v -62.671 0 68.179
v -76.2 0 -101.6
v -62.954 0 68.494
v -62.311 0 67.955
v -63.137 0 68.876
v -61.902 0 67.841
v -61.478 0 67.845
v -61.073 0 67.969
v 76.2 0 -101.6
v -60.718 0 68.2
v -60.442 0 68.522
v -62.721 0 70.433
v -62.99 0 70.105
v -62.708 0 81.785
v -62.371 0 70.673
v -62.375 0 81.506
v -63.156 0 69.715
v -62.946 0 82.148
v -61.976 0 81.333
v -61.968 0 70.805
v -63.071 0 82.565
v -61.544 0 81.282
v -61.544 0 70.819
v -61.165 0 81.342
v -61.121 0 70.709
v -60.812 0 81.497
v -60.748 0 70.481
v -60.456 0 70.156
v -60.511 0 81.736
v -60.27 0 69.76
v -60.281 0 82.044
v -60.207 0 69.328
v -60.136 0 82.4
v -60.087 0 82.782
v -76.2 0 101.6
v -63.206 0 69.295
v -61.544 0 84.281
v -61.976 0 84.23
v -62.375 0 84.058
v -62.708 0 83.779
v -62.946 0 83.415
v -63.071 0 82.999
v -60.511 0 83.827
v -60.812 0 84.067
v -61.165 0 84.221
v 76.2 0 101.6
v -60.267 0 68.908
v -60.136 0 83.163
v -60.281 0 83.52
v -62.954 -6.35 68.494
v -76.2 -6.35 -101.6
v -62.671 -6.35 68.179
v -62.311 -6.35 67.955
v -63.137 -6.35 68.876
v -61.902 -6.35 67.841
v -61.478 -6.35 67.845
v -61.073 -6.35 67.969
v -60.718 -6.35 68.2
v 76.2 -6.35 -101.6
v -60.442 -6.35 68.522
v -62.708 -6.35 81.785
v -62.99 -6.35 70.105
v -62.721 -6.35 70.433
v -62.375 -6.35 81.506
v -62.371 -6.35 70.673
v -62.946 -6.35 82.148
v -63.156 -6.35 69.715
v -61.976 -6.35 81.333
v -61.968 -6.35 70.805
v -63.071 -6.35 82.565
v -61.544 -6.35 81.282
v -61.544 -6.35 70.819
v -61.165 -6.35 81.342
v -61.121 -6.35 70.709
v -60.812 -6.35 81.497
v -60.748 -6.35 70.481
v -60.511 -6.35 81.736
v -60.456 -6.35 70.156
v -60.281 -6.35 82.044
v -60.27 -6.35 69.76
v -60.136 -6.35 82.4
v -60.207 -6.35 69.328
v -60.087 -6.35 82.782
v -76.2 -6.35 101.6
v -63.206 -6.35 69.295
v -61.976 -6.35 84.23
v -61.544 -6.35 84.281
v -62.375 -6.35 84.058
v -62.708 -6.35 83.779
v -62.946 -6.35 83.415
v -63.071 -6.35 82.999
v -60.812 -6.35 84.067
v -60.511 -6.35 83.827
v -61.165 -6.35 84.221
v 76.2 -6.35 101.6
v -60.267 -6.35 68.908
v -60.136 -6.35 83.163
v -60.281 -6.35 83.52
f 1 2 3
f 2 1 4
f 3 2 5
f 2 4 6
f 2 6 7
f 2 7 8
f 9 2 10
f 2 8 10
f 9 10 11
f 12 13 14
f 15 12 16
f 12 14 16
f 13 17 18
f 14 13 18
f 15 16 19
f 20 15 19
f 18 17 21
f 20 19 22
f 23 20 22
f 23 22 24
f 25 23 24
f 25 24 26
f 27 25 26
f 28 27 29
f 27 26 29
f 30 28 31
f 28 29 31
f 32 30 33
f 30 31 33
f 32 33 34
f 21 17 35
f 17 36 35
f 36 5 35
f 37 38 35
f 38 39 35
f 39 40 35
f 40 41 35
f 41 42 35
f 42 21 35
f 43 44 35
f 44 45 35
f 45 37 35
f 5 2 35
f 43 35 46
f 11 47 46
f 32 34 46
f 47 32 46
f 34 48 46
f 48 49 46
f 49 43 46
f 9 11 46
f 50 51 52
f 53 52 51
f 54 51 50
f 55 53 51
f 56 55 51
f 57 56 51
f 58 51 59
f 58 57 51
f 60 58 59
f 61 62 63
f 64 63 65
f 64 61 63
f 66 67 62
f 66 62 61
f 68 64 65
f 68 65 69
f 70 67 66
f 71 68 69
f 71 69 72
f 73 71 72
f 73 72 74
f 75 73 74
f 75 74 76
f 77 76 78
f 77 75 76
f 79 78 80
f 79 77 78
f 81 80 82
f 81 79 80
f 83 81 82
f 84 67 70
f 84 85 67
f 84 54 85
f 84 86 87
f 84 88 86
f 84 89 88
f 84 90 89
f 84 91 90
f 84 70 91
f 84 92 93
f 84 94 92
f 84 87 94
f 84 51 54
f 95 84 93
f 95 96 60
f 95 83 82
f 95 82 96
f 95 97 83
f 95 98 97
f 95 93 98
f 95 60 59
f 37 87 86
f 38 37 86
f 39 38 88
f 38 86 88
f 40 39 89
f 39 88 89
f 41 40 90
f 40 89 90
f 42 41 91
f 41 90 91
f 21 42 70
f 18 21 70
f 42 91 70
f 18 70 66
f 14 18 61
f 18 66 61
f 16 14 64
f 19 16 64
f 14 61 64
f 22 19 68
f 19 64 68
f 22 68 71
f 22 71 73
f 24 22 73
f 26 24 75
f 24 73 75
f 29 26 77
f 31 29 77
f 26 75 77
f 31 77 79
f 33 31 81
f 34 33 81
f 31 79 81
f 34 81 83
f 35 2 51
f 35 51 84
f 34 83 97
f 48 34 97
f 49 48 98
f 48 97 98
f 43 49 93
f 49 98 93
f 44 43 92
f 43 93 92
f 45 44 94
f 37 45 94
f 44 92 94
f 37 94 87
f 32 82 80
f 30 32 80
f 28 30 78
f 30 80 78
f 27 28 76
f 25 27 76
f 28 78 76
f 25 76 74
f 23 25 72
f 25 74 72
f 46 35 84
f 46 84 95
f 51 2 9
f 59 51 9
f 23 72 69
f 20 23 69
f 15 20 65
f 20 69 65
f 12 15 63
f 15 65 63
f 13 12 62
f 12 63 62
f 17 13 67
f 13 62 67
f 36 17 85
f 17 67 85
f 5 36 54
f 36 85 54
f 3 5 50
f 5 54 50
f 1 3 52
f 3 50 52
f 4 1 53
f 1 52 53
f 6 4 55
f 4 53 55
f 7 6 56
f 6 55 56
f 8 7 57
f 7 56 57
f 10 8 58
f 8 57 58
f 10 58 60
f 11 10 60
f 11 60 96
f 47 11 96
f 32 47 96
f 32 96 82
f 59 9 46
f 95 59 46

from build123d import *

# Parameters (mm, degrees)
F0_W     = 152.4
F0_H     = 203.2
F1_DEPTH = 6.35
F4_DEPTH = 25
F5_DEPTH = 25


with BuildPart() as f1:
    # F0 (on Front) → F1 (new body)
    with BuildSketch(Plane.XZ):
        Rectangle(F0_W, F0_H)
    extrude(amount=F1_DEPTH)

    # F3 (on face) → F4 (cut)
    with BuildSketch(Plane.XZ.offset(6.35)):
        with BuildLine():
            Line((-61.5444034338, 82.55), (-61.5444034338, 84.2812365605))
            ThreePointArc((-61.5444034338, 84.2812365605), (-63.0868195891, 82.7818363905), (-61.5444034338, 81.2824362205))
            Line((-61.5444034338, 81.2824362205), (-61.5444034338, 82.55))
        make_face()
        with BuildLine():
            ThreePointArc((-61.5444034338, 81.2824362205), (-60.5112675837, 81.736280135), (-60.0868195891, 82.7818363905))
            ThreePointArc((-60.0868195891, 82.7818363905), (-60.5112675837, 83.827392646), (-61.5444034338, 84.2812365605))
            Line((-61.5444034338, 84.2812365605), (-61.5444034338, 82.55))
            Line((-61.5444034338, 82.55), (-61.5444034338, 81.2824362205))
        make_face()
    extrude(amount=-F4_DEPTH, mode=Mode.SUBTRACT)

    # F3 (on face) → F5 (cut)
    with BuildSketch(Plane.XZ.offset(6.35)):
        with BuildLine():
            ThreePointArc((-60.2067813873, 69.3278759718), (-60.5901868033, 70.329482948), (-61.5444034338, 70.8190612052))
            ThreePointArc((-61.5444034338, 70.8190612052), (-62.8233759714, 68.3262689956), (-60.2067813873, 69.3278759718))
        make_face()
    extrude(amount=-F5_DEPTH, mode=Mode.SUBTRACT)


solid = f1.part
